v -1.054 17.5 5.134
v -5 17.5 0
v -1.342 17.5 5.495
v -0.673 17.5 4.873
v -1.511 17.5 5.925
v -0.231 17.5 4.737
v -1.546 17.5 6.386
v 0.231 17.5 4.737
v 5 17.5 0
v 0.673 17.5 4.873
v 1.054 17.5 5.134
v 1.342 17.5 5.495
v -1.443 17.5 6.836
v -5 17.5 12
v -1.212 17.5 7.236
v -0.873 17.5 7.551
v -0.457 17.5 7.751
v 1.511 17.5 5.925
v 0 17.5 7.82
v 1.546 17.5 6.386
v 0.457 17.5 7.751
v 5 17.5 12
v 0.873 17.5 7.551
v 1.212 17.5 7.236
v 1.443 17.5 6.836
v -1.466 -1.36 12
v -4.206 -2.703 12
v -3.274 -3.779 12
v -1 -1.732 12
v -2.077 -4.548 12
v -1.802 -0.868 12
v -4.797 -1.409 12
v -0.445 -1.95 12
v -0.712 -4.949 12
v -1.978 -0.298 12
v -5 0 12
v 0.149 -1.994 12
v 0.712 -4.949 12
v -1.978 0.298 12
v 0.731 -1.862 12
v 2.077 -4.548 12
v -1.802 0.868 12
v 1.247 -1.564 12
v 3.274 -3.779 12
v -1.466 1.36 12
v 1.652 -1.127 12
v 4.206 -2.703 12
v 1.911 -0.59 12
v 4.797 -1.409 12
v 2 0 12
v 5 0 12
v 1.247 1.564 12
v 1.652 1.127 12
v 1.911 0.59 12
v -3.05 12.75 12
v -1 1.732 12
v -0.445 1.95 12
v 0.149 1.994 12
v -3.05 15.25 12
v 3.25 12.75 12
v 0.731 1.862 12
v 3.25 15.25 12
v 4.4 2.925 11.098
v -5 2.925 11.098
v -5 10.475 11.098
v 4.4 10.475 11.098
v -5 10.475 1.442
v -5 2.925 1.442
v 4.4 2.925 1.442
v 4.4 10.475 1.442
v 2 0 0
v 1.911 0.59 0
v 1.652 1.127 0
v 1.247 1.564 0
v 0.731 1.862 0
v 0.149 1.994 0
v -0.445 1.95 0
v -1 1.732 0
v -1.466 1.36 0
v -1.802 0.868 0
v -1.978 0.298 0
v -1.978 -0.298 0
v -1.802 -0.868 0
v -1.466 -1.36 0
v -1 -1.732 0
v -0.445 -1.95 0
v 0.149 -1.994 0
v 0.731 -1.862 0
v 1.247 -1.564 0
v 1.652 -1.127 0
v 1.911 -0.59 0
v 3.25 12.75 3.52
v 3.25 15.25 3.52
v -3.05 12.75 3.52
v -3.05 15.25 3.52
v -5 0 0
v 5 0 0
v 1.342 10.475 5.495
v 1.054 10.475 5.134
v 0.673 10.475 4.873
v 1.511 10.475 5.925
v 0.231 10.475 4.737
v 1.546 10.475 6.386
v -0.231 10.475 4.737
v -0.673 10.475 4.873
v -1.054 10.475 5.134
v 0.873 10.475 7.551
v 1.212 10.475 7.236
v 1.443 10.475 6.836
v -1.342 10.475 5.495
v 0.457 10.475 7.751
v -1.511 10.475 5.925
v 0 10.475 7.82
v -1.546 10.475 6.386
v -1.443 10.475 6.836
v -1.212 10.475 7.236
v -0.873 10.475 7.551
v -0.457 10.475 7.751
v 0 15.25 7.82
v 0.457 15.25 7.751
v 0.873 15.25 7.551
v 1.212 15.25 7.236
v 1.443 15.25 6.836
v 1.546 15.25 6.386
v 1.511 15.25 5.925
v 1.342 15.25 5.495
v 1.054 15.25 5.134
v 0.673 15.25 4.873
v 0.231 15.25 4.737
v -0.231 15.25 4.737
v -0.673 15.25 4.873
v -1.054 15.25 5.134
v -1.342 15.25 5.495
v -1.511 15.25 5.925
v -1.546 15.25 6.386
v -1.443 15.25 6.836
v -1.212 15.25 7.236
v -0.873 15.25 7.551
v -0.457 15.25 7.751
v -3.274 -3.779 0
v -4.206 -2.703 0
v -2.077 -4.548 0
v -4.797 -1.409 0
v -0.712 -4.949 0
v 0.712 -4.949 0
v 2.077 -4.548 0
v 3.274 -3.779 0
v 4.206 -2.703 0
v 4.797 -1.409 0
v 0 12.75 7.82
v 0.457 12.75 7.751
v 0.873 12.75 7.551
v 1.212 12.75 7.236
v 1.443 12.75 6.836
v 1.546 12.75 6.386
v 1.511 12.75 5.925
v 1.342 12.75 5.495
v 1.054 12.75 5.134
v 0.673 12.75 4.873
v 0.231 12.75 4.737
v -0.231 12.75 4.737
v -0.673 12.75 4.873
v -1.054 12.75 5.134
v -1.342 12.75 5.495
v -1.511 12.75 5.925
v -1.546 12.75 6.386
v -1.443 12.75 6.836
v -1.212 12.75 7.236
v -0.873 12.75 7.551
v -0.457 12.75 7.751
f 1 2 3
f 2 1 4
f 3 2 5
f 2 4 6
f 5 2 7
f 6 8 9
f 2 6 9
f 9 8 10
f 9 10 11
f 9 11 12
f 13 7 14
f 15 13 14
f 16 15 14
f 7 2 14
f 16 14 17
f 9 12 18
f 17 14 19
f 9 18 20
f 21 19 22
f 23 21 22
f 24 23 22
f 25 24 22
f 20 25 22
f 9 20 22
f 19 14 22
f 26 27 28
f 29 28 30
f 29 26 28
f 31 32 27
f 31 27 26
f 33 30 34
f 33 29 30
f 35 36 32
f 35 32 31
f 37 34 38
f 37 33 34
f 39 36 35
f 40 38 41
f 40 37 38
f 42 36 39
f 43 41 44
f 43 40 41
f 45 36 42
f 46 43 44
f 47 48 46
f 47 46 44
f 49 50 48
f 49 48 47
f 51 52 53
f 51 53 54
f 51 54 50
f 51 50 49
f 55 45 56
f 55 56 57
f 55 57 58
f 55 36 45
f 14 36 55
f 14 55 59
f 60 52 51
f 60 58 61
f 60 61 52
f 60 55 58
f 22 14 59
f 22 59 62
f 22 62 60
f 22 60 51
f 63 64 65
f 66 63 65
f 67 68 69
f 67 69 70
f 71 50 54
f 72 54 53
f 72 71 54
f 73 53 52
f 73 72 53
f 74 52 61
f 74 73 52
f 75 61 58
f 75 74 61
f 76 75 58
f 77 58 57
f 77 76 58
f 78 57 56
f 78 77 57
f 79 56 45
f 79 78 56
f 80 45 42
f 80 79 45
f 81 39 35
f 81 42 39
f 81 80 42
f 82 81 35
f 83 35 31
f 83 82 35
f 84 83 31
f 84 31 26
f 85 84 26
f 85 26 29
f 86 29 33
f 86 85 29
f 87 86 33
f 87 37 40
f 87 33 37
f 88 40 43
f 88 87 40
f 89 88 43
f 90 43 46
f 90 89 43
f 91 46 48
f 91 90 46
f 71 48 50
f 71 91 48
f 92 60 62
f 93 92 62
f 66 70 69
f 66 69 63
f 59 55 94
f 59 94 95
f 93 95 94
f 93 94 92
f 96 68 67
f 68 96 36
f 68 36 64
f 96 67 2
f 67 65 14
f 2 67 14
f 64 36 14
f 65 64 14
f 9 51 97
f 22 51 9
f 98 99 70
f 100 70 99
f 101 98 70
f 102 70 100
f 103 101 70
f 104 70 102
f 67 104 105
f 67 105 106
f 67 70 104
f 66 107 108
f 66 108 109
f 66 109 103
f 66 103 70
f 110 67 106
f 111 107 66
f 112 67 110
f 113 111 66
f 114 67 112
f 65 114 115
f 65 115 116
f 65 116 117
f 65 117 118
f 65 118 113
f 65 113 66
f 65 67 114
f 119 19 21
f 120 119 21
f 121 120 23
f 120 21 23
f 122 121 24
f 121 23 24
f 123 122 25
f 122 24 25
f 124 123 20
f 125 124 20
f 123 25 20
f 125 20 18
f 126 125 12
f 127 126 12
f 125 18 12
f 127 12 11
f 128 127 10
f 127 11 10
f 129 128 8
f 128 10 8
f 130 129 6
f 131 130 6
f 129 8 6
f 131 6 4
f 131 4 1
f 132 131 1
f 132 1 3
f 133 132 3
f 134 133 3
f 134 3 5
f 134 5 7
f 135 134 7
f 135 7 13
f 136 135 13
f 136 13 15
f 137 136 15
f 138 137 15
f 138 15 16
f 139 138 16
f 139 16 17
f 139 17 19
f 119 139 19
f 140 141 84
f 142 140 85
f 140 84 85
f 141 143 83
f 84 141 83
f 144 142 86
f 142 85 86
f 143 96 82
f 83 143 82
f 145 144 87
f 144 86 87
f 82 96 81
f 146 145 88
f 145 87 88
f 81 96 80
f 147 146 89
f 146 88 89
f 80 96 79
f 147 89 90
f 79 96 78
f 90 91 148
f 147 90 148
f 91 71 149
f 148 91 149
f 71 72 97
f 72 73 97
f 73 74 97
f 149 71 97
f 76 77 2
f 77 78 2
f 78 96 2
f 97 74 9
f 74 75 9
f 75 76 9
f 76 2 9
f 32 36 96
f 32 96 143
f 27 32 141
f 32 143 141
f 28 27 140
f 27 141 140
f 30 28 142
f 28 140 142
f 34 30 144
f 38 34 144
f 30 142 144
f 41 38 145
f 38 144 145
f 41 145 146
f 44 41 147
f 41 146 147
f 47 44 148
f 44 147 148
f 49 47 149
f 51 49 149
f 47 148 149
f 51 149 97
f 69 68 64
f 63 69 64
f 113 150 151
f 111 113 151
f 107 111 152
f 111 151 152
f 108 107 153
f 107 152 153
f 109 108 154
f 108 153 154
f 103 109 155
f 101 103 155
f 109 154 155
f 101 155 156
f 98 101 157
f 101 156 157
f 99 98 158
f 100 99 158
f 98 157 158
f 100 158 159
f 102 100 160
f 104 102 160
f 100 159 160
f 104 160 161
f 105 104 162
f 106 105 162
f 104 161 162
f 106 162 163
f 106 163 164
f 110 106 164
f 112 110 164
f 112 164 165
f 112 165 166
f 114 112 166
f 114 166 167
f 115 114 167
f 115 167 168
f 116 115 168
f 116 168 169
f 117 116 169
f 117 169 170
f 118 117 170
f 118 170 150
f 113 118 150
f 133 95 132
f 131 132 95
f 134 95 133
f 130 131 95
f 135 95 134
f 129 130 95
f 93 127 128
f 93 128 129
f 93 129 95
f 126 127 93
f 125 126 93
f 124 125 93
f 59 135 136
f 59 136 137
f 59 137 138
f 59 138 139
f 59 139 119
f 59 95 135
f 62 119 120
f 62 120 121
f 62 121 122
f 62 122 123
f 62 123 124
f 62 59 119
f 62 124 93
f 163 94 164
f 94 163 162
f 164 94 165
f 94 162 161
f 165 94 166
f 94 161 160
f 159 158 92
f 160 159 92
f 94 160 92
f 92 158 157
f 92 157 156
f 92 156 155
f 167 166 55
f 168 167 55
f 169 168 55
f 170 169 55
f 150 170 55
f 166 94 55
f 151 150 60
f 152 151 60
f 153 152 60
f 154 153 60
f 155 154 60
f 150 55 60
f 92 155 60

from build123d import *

# Parameters (mm, degrees)
SKETCH_1_R          = 5
SKETCH_1_R_2        = 2
EXTRUDE_1_DEPTH     = 12
SKETCH_2_W          = 10
SKETCH_2_H          = 17.5
EXTRUDE_2_DEPTH     = 12
SKETCH_3_R          = 2
CUT_EXTRUDE_1_DEPTH = 22.800229357
SKETCH_5_W          = 6.3
SKETCH_5_H          = 2.5
CUT_EXTRUDE_3_DEPTH = 8.48
SKETCH_10_W         = 9.65653404
SKETCH_10_H         = 7.55
CUT_EXTRUDE_5_DEPTH = 9.4
CUT_EXTRUDE_4_REACH = 27.986
SKETCH_6_R          = 1.55


with BuildPart() as part:
    # Эскиз1 → Бобышка-Вытянуть1 (new body)
    with BuildSketch(Plane.XY):
        Circle(SKETCH_1_R)
        Circle(SKETCH_1_R_2, mode=Mode.SUBTRACT)
    extrude(amount=EXTRUDE_1_DEPTH)

    # Эскиз2 → Бобышка-Вытянуть2 (add)
    with BuildSketch(Plane.XY.offset(12)):
        with Locations((0, 8.75)):
            Rectangle(SKETCH_2_W, SKETCH_2_H)
    extrude(amount=-EXTRUDE_2_DEPTH)

    # Эскиз3 → Вырез-Вытянуть1 (cut, through all)
    with BuildSketch(Plane.XY.offset(12)):
        Circle(SKETCH_3_R)
    extrude(amount=-CUT_EXTRUDE_1_DEPTH, mode=Mode.SUBTRACT)

    # Эскиз5 → Вырез-Вытянуть3 (cut)
    with BuildSketch(Plane.XY.offset(12)):
        with Locations((0.1, 14)):
            Rectangle(SKETCH_5_W, SKETCH_5_H)
    extrude(amount=-CUT_EXTRUDE_3_DEPTH, mode=Mode.SUBTRACT)

    # Эскиз10 → Вырез-Вытянуть5 (cut)
    with BuildSketch(Plane.ZY.offset(5)):
        with Locations((6.27, 6.7)):
            Rectangle(SKETCH_10_W, SKETCH_10_H)
    extrude(amount=-CUT_EXTRUDE_5_DEPTH, mode=Mode.SUBTRACT)

    # Вырез-Вытянуть4: up to this face of the body (flat: up to its plane)
    cut_extrude_4_end = Plane(part.part.faces().sort_by_distance((-0.3, 10.475, 6.27))[0])
    # Эскиз6 → Вырез-Вытянуть4 (cut, up to the picked face)
    with BuildSketch(Plane(origin=(0, 17.5, 0), x_dir=(1, 0, 0), z_dir=(0, 1, 0)), mode=Mode.PRIVATE) as cut_extrude_4_sk1:
        with Locations(Location((0, -6.27, 0), (0, 0, 270))):
            Circle(SKETCH_6_R)
    cut_extrude_4_tool1 = split(extrude(cut_extrude_4_sk1.sketch, amount=-CUT_EXTRUDE_4_REACH, mode=Mode.PRIVATE), bisect_by=cut_extrude_4_end, keep=Keep.BOTH, mode=Mode.PRIVATE)
    add(cut_extrude_4_tool1.solids().sort_by(Axis((0, 17.5, 6.27), (0, -1, 0)))[0], mode=Mode.SUBTRACT)


solid = part.part
